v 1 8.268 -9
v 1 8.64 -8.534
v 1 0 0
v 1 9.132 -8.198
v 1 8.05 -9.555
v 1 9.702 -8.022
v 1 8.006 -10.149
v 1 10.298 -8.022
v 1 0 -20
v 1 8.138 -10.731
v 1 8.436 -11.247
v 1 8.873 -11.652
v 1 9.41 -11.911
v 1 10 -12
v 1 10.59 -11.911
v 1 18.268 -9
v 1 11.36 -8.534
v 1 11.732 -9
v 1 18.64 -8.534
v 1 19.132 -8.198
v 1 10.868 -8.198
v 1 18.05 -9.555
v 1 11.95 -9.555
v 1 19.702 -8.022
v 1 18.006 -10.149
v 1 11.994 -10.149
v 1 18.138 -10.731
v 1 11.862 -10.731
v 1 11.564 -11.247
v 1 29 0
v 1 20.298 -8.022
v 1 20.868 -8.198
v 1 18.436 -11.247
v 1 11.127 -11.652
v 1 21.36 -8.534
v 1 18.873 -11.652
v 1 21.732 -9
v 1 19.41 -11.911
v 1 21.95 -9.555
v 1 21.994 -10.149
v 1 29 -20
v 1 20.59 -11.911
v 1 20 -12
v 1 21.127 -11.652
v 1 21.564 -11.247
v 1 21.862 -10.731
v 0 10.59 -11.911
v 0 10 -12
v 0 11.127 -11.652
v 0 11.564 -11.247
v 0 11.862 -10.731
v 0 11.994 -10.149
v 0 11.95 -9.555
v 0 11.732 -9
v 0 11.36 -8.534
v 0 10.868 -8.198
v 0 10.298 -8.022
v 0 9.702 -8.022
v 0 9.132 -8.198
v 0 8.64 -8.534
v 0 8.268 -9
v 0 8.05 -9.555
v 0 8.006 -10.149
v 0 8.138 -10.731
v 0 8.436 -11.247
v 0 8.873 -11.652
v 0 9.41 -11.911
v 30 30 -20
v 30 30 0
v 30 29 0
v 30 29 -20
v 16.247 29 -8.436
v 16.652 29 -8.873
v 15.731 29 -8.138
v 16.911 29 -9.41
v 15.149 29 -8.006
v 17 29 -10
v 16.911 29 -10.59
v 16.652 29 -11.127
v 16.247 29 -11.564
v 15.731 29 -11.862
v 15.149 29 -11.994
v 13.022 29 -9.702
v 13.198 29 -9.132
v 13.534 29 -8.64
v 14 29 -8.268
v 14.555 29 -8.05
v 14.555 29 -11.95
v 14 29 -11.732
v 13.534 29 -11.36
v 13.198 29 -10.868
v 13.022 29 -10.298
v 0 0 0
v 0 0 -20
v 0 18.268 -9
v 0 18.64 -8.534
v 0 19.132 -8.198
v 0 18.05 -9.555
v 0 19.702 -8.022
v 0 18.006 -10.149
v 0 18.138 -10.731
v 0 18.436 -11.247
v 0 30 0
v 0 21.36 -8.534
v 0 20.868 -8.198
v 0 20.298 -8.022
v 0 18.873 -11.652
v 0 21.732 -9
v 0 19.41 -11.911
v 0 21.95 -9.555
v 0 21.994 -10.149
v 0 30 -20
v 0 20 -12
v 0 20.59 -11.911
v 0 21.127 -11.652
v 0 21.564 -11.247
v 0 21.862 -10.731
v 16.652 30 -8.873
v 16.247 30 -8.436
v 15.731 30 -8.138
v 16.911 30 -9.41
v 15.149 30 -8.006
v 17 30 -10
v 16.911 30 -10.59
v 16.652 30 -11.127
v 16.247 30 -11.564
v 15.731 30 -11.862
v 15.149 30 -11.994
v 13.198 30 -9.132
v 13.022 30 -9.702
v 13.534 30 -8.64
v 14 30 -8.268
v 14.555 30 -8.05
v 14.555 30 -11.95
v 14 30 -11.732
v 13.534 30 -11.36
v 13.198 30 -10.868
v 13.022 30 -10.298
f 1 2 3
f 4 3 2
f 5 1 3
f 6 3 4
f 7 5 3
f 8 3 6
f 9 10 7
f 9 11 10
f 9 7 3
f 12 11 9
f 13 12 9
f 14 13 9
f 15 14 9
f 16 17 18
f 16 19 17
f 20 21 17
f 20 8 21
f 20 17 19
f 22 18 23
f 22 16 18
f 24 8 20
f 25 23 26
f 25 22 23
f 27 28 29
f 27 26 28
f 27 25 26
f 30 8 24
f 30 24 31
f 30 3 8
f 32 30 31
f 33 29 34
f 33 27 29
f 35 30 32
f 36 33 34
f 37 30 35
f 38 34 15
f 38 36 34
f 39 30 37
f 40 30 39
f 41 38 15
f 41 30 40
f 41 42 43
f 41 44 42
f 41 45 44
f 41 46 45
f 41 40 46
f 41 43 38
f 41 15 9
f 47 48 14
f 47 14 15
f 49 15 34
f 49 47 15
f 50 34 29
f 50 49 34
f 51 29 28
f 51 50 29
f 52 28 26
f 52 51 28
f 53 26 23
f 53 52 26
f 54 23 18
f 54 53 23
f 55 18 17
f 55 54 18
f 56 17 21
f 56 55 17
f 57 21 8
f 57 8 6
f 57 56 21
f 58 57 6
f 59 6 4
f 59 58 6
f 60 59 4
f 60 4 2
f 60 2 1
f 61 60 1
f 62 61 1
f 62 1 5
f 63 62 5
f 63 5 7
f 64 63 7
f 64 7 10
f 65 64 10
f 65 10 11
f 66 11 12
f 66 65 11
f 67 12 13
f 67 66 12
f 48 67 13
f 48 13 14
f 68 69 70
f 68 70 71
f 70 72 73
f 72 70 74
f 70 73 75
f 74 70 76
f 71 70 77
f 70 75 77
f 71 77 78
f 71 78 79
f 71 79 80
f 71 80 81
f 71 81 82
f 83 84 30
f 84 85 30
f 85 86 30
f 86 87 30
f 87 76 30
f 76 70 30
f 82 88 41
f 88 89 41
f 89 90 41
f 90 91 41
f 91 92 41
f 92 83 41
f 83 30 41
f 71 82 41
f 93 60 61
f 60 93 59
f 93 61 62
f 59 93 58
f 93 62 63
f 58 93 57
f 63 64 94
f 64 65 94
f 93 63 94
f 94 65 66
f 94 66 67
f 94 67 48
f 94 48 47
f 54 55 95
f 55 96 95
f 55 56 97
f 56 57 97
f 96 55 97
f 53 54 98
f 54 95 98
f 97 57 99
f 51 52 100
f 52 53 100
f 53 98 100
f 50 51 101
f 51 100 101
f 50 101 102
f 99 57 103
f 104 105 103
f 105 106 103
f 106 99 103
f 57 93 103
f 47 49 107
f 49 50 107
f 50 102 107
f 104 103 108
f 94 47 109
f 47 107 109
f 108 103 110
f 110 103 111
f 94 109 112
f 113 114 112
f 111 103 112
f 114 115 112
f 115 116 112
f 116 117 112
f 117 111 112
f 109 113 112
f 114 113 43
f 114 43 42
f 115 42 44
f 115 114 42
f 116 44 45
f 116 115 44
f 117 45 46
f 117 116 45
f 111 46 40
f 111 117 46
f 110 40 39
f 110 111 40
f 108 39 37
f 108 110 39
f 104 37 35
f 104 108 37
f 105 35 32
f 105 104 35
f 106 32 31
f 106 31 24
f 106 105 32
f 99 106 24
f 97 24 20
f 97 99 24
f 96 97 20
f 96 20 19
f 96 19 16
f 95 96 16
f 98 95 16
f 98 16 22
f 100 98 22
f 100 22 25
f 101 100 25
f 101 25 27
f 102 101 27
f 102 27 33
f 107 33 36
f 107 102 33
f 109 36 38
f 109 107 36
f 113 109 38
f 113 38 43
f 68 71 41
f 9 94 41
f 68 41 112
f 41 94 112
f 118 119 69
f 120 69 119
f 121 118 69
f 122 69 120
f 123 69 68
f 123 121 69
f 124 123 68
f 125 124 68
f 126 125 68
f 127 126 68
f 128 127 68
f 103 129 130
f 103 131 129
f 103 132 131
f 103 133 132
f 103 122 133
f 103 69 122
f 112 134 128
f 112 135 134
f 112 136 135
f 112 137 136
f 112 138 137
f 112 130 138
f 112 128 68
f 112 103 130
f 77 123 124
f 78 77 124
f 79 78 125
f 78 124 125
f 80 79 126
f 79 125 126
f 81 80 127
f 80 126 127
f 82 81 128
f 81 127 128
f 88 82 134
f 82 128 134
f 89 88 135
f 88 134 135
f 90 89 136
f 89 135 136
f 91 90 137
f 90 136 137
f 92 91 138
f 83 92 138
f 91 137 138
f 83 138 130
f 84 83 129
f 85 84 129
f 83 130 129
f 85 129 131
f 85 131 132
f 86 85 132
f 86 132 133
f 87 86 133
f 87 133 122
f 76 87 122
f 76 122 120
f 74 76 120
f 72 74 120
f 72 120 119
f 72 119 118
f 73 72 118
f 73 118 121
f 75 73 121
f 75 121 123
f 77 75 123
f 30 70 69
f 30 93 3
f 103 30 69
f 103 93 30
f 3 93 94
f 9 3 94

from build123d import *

# Parameters (mm, degrees)
SKETCH2_W           = 20
SKETCH2_H           = 30
SKETCH2_R           = 2
BOSS_EXTRUDE1_DEPTH = 1
SKETCH3_W           = 20
SKETCH3_H           = 1
BOSS_EXTRUDE2_DEPTH = 29
SKETCH4_R           = 2
CUT_EXTRUDE1_DEPTH  = 30


with BuildPart() as part:
    # Sketch2 → Boss-Extrude1 (new body)
    with BuildSketch(Plane(origin=(0, 0, 0), x_dir=(0, 0, -1), z_dir=(1, 0, 0))):
        with Locations((10, 15)):
            Rectangle(SKETCH2_W, SKETCH2_H)
        with Locations((10, 20)):
            Circle(SKETCH2_R, mode=Mode.SUBTRACT)
        with Locations((10, 10)):
            Circle(SKETCH2_R, mode=Mode.SUBTRACT)
    extrude(amount=BOSS_EXTRUDE1_DEPTH)

    # Sketch3 → Boss-Extrude2 (add)
    with BuildSketch(Plane(origin=(1, 0, 0), x_dir=(0, 0, -1), z_dir=(1, 0, 0))):
        with Locations((10, 29.5)):
            Rectangle(SKETCH3_W, SKETCH3_H)
    extrude(amount=BOSS_EXTRUDE2_DEPTH)

    # Sketch4 → Cut-Extrude1 (cut)
    with BuildSketch(Plane(origin=(0, 30, 0), x_dir=(1, 0, 0), z_dir=(0, 1, 0))):
        with Locations((15, 10)):
            Circle(SKETCH4_R)
    extrude(amount=-CUT_EXTRUDE1_DEPTH, mode=Mode.SUBTRACT)


solid = part.part
